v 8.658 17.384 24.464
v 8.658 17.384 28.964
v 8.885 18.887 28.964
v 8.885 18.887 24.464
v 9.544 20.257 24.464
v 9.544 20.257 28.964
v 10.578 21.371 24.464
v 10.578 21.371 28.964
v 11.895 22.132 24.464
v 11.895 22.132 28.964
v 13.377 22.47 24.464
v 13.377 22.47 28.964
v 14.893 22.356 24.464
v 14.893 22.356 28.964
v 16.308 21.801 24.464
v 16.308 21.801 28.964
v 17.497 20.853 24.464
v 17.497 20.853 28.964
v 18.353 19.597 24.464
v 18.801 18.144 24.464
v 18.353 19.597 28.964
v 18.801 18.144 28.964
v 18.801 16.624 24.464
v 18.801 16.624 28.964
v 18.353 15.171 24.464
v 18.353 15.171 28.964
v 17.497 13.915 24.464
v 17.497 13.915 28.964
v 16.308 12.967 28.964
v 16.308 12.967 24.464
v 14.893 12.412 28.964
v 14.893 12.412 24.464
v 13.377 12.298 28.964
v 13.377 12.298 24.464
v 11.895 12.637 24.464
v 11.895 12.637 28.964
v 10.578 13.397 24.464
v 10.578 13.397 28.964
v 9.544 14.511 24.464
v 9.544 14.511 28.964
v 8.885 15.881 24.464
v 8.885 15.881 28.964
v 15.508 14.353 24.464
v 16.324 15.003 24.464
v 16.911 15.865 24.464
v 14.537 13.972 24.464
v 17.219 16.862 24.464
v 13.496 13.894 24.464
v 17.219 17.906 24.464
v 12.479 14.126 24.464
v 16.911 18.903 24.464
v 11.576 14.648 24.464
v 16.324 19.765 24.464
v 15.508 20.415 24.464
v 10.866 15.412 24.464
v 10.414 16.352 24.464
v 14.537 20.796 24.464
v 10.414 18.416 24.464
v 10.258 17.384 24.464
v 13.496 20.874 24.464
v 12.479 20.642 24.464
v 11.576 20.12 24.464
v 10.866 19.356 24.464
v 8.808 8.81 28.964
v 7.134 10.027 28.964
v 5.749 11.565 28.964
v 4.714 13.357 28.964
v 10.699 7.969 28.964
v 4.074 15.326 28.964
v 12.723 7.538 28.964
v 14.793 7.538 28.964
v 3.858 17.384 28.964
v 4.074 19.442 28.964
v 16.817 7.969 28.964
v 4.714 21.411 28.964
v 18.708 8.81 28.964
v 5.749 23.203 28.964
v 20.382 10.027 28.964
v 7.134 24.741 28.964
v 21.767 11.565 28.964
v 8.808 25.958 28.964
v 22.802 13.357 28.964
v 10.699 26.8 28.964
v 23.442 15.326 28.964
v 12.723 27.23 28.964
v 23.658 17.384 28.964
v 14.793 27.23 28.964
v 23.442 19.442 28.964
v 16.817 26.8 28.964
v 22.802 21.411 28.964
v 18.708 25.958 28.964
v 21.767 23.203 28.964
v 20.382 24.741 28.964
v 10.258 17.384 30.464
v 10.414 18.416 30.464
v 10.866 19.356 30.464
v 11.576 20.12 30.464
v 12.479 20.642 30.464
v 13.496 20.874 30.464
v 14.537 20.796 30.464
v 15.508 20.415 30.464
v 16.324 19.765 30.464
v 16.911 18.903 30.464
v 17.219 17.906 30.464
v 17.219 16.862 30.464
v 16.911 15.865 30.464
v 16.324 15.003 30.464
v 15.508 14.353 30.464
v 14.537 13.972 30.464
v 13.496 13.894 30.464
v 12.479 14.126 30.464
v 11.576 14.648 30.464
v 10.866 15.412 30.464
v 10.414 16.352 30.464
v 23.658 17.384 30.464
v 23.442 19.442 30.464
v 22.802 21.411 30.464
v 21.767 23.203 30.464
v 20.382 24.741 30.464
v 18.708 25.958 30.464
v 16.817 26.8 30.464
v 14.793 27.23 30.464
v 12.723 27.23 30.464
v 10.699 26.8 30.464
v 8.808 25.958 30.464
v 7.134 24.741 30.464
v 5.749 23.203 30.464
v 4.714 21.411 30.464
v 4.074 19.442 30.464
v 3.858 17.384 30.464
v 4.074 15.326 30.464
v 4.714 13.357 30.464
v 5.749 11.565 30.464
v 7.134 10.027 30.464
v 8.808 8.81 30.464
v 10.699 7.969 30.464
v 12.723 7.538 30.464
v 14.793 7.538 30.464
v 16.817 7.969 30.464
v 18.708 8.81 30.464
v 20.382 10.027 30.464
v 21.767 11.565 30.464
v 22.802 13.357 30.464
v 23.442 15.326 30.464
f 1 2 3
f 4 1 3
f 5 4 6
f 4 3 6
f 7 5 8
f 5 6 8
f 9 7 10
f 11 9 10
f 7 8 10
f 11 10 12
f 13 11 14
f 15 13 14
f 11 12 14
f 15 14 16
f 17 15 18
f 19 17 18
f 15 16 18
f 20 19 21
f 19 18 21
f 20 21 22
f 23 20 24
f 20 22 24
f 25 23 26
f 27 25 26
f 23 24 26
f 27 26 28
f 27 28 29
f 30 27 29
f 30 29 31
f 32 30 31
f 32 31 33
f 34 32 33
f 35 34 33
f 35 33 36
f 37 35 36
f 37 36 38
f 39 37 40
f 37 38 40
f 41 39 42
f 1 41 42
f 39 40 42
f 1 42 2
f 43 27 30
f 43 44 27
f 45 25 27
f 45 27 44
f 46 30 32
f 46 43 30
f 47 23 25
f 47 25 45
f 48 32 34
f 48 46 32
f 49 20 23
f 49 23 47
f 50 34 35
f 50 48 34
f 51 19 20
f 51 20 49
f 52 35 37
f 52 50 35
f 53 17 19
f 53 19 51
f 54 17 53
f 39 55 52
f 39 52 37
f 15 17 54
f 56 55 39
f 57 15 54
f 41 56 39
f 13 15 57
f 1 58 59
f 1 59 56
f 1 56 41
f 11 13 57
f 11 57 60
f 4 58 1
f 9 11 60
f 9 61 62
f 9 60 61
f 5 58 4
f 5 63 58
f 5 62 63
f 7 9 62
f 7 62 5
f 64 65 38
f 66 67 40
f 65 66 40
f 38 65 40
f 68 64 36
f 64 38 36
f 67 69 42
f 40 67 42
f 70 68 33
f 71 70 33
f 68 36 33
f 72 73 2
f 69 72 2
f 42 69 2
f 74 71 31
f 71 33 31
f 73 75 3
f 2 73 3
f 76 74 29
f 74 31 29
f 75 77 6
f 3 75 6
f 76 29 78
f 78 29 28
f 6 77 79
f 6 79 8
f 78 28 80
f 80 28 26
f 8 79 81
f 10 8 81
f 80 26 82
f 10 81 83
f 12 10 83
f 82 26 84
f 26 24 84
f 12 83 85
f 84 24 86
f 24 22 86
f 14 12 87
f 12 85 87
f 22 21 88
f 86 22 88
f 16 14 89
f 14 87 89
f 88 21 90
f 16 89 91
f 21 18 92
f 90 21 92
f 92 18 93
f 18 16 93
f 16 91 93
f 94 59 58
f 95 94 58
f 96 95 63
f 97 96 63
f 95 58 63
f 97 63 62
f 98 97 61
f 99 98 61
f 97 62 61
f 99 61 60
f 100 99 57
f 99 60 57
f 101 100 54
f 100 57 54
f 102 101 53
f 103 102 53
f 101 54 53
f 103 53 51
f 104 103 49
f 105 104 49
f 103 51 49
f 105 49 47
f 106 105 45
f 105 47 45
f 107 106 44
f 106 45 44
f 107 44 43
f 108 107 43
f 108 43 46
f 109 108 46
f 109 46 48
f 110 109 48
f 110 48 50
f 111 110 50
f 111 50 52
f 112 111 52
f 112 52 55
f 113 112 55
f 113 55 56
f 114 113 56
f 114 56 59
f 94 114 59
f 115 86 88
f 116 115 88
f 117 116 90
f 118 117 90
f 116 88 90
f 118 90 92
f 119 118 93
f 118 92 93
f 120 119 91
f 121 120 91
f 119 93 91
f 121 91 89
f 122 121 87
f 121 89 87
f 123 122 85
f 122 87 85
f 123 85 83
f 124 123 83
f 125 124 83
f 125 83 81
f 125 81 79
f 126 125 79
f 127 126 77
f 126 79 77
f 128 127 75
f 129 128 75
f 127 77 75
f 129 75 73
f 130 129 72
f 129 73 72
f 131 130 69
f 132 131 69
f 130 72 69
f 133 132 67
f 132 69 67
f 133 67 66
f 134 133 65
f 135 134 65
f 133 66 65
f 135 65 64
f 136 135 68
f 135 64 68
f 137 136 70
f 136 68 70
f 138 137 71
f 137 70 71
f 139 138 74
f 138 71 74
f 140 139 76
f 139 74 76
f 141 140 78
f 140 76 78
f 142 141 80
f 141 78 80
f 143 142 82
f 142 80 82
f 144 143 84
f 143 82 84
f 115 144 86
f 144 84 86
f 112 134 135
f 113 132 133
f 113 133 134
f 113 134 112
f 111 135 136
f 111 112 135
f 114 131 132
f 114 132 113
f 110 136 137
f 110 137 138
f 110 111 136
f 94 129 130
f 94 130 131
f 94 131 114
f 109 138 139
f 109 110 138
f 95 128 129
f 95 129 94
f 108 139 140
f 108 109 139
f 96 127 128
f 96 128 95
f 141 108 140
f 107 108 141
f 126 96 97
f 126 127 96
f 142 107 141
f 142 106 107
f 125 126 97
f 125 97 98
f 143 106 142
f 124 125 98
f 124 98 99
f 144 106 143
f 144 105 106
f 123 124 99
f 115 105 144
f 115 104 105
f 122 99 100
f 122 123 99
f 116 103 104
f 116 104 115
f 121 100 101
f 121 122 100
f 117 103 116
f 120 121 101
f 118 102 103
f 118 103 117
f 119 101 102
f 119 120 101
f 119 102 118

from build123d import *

# Parameters (mm, degrees)
SKETCH1_R           = 9.9
BOSS_EXTRUDE1_DEPTH = 1.5
SKETCH2_R           = 5.1
BOSS_EXTRUDE2_DEPTH = 4.5
SKETCH3_R           = 3.5
CUT_EXTRUDE1_DEPTH  = 7


with BuildPart() as part:
    # Sketch1 → Boss-Extrude1 (new body)
    with BuildSketch(Plane.XY.offset(28.963778517)):
        with Locations((13.758033718, 17.384066602)):
            Circle(SKETCH1_R)
    extrude(amount=BOSS_EXTRUDE1_DEPTH)

    # Sketch2 → Boss-Extrude2 (add)
    with BuildSketch(Plane(origin=(0, 0, 28.963778517), x_dir=(-1, 0, 0), z_dir=(0, 0, -1))):
        with Locations((-13.758033718, 17.384066602)):
            Circle(SKETCH2_R)
    extrude(amount=BOSS_EXTRUDE2_DEPTH)

    # Sketch3 → Cut-Extrude1 (cut, through all)
    with BuildSketch(Plane(origin=(0, 0, 24.463778517), x_dir=(-1, 0, 0), z_dir=(0, 0, -1))):
        with Locations((-13.758033718, 17.384066602)):
            Circle(SKETCH3_R)
    extrude(amount=-CUT_EXTRUDE1_DEPTH, mode=Mode.SUBTRACT)


solid = part.part
